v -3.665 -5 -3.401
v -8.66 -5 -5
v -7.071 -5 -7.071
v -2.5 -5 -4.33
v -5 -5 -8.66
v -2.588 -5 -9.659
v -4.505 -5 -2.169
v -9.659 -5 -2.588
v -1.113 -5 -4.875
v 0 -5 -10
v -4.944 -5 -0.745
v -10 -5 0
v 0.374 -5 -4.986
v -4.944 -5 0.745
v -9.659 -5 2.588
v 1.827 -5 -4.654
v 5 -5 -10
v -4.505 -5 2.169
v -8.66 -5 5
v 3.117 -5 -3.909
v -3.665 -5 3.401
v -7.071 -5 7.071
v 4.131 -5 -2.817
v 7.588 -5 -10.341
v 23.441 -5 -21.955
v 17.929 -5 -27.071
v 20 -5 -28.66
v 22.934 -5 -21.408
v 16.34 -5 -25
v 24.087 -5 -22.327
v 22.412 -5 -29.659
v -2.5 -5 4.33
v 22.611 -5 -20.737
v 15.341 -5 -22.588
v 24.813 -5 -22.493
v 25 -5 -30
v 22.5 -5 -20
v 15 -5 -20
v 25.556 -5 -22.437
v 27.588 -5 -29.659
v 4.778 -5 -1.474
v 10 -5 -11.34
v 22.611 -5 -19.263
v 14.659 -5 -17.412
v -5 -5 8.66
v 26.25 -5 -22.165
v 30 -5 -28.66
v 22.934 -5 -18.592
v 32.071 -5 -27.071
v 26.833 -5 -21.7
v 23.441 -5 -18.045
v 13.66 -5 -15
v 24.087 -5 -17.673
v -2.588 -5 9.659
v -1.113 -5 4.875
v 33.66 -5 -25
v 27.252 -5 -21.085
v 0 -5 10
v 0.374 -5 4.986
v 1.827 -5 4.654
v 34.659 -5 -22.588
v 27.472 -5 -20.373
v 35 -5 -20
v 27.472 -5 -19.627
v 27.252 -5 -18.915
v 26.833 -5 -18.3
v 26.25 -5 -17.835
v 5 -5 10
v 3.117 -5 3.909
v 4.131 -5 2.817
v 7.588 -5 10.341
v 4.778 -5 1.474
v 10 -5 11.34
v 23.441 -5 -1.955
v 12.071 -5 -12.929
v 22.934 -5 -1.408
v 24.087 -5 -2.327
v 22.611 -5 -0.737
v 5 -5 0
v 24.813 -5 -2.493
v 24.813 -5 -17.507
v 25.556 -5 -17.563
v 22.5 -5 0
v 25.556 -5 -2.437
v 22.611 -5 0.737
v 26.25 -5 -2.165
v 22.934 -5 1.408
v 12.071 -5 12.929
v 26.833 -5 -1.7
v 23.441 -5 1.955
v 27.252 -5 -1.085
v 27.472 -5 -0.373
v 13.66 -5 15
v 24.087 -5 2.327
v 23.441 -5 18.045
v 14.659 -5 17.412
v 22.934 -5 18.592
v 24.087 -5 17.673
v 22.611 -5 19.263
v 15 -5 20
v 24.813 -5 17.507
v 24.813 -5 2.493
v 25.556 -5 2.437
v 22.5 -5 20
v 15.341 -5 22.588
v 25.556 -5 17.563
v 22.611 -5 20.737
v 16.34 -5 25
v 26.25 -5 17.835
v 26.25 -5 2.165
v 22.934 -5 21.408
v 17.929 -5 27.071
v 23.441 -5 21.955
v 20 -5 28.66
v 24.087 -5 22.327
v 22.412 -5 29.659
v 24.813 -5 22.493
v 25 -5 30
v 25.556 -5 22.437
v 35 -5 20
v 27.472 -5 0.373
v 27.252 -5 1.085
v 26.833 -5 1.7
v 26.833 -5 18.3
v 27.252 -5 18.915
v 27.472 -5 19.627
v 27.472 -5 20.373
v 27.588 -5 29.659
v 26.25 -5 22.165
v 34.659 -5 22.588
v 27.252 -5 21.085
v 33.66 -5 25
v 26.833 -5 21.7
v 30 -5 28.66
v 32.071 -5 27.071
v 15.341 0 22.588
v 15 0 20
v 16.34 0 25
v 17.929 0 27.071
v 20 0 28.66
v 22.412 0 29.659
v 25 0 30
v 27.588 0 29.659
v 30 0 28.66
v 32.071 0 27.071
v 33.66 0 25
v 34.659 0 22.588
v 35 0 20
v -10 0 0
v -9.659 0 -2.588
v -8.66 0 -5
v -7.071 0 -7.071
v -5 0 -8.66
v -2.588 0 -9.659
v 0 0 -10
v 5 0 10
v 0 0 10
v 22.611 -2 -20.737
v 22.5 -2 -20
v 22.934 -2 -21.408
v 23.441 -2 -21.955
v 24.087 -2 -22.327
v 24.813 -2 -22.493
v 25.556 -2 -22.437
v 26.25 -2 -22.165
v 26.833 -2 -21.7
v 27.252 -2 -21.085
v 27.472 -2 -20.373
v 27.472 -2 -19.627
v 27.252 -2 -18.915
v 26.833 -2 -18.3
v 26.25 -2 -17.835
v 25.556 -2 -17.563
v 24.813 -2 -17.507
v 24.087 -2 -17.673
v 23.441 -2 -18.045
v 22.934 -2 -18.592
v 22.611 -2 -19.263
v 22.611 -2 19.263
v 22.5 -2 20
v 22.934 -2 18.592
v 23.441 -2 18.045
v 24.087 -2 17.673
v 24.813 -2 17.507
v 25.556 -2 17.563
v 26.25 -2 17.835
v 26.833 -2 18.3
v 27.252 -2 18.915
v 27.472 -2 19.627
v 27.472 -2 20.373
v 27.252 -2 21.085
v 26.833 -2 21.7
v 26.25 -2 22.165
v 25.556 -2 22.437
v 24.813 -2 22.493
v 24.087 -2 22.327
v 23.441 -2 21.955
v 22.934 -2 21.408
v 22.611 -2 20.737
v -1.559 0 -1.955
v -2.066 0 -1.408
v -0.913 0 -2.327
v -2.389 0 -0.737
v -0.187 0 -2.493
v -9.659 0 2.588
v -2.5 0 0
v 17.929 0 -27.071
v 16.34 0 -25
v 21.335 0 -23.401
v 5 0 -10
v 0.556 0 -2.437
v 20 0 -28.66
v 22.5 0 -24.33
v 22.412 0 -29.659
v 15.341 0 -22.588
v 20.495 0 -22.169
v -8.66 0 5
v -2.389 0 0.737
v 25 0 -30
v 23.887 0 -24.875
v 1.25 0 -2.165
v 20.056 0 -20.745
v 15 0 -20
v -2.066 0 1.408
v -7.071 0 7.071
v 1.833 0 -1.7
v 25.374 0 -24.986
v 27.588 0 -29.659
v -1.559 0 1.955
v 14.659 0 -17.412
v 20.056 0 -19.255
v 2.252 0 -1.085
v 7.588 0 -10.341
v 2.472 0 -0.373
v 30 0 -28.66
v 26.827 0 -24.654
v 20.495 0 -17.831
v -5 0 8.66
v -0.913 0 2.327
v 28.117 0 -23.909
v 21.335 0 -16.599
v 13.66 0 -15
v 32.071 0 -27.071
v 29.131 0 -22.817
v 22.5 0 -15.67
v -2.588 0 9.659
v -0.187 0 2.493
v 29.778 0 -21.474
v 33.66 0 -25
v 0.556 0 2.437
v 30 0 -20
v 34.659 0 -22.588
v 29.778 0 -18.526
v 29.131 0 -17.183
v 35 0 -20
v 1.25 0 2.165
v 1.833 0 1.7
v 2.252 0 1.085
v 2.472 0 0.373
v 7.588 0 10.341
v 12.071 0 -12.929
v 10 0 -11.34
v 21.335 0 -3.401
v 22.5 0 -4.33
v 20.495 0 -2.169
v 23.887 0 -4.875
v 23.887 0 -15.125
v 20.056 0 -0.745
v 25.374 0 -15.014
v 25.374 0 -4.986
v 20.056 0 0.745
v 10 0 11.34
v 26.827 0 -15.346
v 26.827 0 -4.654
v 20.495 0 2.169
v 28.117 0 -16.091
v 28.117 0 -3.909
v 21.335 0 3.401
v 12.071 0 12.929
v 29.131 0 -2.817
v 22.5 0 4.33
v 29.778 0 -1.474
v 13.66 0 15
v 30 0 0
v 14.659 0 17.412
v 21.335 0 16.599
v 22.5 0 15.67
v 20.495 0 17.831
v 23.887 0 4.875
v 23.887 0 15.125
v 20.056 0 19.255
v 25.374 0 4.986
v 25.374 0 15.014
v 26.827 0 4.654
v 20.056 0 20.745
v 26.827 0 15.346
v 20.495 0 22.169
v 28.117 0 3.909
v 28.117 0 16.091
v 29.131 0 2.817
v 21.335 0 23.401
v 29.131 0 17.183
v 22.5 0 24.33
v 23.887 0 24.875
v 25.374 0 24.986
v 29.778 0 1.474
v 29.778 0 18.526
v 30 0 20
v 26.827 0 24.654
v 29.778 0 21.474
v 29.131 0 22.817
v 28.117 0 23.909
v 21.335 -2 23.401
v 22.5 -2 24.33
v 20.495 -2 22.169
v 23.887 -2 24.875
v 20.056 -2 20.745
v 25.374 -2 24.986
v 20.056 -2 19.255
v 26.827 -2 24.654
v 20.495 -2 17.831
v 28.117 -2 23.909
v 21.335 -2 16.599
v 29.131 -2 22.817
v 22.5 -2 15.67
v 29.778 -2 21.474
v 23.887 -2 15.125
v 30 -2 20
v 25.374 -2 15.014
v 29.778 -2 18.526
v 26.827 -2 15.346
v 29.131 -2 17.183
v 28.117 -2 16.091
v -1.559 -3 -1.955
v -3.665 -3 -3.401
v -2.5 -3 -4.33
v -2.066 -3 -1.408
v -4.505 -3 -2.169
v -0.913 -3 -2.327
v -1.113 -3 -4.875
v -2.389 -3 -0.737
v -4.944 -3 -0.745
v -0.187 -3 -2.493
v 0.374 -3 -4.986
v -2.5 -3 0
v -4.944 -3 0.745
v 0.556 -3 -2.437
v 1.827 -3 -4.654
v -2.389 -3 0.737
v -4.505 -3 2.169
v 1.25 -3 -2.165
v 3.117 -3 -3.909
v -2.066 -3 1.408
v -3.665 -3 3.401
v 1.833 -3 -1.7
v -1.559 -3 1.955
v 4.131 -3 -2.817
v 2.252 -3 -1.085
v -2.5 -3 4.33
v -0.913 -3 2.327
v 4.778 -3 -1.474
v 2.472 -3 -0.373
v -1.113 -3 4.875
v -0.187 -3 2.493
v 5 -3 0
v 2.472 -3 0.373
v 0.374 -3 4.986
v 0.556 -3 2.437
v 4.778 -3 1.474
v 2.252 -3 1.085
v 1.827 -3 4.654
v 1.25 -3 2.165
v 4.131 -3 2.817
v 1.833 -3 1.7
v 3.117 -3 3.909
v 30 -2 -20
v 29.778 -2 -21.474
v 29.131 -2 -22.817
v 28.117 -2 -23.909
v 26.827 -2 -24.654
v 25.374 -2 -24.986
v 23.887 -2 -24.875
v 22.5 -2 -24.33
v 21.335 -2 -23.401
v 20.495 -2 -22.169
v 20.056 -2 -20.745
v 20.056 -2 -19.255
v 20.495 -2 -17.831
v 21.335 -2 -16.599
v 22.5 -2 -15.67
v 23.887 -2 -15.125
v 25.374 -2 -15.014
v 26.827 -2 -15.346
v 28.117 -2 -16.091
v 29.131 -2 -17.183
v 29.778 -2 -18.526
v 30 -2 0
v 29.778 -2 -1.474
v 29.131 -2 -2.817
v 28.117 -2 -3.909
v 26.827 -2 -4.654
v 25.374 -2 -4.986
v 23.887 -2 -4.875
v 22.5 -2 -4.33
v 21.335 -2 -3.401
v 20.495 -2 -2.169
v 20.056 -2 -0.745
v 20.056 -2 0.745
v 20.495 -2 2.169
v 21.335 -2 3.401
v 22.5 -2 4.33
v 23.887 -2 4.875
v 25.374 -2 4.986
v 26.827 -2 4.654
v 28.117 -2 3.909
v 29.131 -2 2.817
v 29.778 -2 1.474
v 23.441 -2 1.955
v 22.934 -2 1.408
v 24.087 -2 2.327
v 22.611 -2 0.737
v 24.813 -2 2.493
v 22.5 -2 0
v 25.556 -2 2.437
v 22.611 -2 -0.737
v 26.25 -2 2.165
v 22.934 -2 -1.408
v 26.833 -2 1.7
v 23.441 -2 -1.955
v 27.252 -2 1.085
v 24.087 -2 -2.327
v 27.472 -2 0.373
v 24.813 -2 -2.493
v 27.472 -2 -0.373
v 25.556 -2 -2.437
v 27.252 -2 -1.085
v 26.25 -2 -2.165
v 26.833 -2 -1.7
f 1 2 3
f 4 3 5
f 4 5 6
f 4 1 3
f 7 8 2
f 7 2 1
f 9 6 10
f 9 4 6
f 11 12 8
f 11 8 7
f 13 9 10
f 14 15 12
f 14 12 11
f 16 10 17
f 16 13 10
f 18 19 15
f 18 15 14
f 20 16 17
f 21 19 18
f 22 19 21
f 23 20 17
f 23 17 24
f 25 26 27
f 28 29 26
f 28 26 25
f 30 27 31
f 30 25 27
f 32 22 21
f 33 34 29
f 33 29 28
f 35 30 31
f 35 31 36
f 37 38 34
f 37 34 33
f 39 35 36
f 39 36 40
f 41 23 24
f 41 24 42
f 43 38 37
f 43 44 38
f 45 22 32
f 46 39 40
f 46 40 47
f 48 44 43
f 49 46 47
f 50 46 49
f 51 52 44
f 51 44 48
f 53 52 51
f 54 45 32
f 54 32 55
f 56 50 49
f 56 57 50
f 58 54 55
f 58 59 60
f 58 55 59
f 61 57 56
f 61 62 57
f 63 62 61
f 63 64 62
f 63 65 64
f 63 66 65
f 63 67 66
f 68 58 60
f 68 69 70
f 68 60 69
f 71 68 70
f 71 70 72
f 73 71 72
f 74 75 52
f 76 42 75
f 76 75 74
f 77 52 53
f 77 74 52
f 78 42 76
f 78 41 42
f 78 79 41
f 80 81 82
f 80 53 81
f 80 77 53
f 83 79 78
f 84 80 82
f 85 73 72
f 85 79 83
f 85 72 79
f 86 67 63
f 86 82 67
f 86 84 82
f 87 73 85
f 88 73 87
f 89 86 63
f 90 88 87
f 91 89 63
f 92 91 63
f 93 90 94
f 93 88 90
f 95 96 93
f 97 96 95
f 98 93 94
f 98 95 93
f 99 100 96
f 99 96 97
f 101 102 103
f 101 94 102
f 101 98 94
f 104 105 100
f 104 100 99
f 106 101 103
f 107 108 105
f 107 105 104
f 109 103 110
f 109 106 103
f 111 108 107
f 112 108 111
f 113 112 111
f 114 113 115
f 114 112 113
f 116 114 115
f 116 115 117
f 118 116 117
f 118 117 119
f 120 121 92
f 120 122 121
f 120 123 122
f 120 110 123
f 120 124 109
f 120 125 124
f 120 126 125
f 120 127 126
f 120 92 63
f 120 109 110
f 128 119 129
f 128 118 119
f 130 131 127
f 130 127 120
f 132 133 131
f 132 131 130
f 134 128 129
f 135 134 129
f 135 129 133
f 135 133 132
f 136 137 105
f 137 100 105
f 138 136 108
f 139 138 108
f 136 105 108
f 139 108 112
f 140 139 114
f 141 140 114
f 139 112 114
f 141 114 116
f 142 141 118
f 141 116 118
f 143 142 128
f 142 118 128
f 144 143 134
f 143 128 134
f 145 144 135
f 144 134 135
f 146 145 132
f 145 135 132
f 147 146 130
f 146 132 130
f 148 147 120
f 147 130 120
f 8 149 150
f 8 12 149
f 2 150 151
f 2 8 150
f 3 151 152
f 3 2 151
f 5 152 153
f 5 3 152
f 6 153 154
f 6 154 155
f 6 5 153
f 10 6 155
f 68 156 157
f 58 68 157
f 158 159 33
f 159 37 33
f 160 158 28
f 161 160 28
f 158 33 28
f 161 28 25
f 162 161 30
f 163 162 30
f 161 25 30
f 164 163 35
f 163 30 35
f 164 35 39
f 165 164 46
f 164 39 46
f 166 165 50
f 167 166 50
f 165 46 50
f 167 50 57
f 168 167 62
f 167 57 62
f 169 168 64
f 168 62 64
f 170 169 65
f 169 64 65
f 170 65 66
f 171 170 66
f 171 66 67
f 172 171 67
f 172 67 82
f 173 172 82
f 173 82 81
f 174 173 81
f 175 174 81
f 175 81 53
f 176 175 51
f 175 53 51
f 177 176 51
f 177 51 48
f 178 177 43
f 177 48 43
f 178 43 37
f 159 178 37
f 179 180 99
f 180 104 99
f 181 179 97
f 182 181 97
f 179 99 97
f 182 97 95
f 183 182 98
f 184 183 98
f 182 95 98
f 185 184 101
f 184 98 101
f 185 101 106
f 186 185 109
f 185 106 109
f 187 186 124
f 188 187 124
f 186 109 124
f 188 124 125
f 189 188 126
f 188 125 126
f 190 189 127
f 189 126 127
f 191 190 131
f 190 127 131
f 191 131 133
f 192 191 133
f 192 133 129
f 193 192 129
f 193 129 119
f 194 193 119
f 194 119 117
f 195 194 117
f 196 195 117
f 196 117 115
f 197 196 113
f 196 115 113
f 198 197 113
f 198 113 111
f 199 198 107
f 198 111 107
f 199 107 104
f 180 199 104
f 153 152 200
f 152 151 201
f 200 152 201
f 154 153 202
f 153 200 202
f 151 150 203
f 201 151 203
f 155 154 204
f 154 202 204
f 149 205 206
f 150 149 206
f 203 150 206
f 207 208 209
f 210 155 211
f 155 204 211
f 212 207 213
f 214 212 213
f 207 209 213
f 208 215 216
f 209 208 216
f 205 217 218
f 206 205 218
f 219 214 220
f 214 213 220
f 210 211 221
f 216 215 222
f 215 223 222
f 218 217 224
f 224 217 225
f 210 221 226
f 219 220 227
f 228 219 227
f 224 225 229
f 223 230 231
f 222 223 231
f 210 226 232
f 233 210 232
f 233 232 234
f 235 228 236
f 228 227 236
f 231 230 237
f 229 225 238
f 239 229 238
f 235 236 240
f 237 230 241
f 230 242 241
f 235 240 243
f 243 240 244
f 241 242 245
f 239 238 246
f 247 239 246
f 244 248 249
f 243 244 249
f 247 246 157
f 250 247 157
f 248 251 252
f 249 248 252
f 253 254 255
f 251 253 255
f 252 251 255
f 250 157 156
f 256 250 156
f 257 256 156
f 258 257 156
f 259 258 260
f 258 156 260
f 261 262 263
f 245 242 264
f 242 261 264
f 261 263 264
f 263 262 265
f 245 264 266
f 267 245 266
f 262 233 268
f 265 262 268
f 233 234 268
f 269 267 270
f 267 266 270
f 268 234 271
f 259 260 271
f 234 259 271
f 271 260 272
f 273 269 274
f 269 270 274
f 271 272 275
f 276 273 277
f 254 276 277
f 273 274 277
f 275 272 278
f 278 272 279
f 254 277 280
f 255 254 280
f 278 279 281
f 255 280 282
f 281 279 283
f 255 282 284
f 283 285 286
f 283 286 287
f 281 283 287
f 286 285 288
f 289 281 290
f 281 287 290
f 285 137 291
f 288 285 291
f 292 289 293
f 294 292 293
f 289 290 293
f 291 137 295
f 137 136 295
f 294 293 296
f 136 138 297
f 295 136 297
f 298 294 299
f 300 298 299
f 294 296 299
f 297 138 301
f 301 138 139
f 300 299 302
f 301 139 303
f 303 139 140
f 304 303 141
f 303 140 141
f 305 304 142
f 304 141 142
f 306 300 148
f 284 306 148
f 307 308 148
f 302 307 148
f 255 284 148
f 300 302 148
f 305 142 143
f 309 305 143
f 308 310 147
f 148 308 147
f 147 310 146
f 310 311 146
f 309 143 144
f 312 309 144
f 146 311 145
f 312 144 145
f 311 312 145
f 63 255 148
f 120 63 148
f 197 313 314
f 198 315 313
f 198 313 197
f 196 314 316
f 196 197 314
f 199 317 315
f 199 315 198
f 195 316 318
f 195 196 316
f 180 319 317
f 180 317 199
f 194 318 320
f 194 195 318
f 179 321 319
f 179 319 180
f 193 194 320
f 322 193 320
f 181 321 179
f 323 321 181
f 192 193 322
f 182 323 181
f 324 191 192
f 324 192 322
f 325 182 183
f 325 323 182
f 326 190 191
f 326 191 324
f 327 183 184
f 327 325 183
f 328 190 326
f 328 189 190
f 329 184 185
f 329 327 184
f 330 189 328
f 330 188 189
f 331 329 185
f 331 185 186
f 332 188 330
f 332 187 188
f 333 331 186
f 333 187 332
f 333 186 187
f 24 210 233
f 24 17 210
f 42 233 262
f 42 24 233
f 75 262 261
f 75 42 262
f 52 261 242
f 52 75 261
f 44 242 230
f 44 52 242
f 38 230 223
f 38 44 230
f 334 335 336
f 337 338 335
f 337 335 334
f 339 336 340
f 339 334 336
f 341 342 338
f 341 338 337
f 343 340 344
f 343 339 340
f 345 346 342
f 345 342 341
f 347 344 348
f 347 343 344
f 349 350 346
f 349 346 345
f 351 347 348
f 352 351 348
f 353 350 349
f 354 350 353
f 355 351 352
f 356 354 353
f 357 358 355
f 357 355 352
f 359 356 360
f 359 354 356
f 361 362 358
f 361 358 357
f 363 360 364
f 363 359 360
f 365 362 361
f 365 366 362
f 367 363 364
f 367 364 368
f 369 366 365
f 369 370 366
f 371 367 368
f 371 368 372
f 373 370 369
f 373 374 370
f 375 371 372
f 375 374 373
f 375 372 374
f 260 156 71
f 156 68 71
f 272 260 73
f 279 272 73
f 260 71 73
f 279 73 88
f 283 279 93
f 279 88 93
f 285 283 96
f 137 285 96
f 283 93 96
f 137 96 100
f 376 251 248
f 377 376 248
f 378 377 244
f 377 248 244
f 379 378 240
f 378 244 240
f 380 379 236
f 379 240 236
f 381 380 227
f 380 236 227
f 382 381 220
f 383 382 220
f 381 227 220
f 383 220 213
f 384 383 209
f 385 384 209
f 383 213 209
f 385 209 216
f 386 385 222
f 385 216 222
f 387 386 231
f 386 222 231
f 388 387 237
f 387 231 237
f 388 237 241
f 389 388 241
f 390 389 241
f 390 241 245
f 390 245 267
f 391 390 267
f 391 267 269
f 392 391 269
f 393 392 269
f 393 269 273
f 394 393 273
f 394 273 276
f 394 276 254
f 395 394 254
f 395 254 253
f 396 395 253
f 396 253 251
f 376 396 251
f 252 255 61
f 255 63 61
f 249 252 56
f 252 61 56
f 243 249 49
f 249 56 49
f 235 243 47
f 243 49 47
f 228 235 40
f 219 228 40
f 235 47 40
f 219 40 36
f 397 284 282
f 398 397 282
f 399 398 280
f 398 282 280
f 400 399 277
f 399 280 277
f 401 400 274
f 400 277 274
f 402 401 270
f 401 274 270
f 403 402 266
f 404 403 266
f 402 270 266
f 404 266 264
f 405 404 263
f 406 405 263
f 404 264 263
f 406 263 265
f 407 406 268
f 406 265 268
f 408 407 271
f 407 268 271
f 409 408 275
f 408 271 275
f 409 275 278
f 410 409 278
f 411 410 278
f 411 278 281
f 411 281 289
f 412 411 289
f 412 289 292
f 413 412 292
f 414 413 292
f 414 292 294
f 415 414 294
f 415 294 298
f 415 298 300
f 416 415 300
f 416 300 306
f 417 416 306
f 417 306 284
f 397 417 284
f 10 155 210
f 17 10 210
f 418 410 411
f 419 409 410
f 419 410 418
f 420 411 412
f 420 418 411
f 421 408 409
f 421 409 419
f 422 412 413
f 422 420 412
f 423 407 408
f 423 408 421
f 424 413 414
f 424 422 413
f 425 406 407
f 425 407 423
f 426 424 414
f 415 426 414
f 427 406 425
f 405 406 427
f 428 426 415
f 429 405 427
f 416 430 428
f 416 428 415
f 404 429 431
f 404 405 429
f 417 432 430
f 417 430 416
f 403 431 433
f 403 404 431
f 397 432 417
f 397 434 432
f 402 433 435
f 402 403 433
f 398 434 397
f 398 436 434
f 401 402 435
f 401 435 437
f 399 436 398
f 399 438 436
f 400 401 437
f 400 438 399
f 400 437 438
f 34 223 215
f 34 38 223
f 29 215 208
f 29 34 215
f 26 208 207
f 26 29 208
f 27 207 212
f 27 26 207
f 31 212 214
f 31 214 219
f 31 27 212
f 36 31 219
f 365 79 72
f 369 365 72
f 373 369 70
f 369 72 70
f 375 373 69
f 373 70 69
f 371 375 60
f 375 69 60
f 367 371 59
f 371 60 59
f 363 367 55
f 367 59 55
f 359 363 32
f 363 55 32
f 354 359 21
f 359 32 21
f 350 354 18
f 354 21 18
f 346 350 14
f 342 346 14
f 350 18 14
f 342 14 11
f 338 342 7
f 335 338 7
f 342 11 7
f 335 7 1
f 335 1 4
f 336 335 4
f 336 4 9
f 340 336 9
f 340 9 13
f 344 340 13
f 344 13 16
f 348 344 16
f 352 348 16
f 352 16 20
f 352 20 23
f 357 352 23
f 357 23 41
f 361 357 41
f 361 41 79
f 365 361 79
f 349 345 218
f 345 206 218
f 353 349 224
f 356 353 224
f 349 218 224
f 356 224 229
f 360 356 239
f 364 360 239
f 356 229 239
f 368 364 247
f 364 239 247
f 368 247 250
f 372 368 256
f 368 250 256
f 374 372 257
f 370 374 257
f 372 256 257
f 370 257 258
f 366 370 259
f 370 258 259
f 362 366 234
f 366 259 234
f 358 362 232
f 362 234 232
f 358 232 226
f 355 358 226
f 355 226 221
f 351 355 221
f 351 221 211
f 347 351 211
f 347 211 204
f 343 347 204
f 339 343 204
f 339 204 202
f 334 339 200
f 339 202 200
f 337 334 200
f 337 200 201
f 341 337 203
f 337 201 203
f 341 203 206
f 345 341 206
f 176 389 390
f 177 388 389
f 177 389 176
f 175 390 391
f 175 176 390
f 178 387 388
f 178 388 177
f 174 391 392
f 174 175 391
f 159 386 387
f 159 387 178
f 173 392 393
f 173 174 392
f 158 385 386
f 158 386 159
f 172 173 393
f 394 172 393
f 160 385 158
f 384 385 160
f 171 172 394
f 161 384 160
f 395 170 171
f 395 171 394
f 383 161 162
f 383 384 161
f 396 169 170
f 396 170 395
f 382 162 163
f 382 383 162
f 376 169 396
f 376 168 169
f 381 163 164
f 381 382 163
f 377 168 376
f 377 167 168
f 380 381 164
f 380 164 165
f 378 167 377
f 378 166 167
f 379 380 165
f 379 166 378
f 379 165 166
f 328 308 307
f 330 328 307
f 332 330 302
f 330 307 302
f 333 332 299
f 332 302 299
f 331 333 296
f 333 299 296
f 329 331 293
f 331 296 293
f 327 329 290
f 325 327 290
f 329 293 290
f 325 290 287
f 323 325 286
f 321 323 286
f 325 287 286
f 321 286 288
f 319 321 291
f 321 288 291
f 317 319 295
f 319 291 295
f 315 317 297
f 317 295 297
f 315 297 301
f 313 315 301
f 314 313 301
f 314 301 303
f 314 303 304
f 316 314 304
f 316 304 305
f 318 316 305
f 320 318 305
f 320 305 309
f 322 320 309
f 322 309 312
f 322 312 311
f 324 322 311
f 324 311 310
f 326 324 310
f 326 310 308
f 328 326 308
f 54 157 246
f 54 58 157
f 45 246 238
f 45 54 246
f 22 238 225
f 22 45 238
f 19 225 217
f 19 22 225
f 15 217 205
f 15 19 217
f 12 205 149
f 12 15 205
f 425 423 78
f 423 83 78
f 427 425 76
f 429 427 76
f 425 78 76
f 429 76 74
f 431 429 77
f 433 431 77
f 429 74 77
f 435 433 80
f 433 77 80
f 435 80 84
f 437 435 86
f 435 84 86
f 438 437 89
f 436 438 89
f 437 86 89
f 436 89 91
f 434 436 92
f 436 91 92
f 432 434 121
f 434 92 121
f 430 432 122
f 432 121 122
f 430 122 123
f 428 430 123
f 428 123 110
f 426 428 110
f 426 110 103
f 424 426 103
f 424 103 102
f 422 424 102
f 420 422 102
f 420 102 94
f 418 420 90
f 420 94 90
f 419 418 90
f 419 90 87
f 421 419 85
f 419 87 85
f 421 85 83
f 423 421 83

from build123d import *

# Parameters (mm, degrees)
F1_DEPTH       = 5
F2_D           = 5
F2_CBORE_D     = 10
F2_CBORE_DEPTH = 2
F3_R           = 9.99999
F5_D           = 5
F5_CBORE_D     = 10
F5_CBORE_DEPTH = 2


# Not quite as in the source:
# - a fillet or chamfer is up to 0.001 mm smaller than in the source, because OpenCascade refuses the exact size


with BuildPart() as f1:
    # F0 (on Front) → F1 (new body)
    with BuildSketch(Plane.XZ):
        Polygon((15, 10), (-10, 10), (-10, -10), (15, -10), (15, -30), (35, -30), (35, -10), (35, 10), (35, 30), (15, 30), align=None)
    extrude(amount=F1_DEPTH)

    # F2 (through all)
    with Locations(Plane(origin=(0, 0, 0), x_dir=(1, 0, 0), z_dir=(0, 1, 0))):
        with Locations((25, -20), (25, 20), (25, 0)):
            CounterBoreHole(F2_D / 2, F2_CBORE_D / 2, F2_CBORE_DEPTH)

    # F3 (radius 10 in the source; OpenCascade refuses exactly that, so slightly less here)
    f3_edges = [f1.edges().sort_by_distance(p)[0] for p in [
        (35, -2.5, 30),
        (35, -2.5, -30),
        (15, -2.5, -30),
        (15, -2.5, 30),
        (-10, -2.5, 10),
        (-10, -2.5, -10),
        (15, -2.5, 10),
        (15, -2.5, -10),
    ]]
    fillet(f3_edges, radius=F3_R)

    # F5 (through all)
    with Locations(Plane.XZ.offset(5)):
        with Locations((0, 0)):
            CounterBoreHole(F5_D / 2, F5_CBORE_D / 2, F5_CBORE_DEPTH)


solid = f1.part
